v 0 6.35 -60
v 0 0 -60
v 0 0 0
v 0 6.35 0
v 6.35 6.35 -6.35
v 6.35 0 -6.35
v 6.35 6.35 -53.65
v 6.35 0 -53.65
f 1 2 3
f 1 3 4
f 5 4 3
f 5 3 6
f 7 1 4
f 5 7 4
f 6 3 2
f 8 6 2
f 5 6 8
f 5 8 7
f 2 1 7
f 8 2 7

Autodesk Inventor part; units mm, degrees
ref_plane "YZ Plane" through (0, 0, 0) normal (1, 0, 0) x (0, 1, 0)
ref_plane "XZ Plane" through (0, 0, 0) normal (0, 1, 0) x (-1, 0, 0)
ref_plane "XY Plane" through (0, 0, 0) normal (0, 0, 1) x (1, 0, 0)
sketch "Sketch1" plane through (0, 0, 0) normal (1, 0, 0) x (0, 1, 0)
  line L0 (0, 0) -> (0, -60)
  line L1 (0, -60) -> (6.35, -60)
  line L2 (6.35, -60) -> (6.35, 0)
  line L3 (6.35, 0) -> (0, 0)
  dimension "d0" = 60
  dimension "d1" = 6.35
extrude "Extrusion1" add sketch "Sketch1" along normal blind 6.35
sketch "Sketch2" plane through (0, 6.35, 0) normal (0, 1, 0) x (1, 0, 0)
  line L0 (0, 60) -> (0, 0) projected
  line L1 (0, 0) -> (4.3687, 4.3687)
  line L2 (0, 0) -> (6.1782, 0) construction
  line L3 (4.3687, 4.3687) -> (6.35, 6.35)
  line L4 (6.35, 60) -> (6.35, 0) projected
  line L5 (6.35, 6.35) -> (6.35, 0)
  line L6 (0, 0) -> (6.35, 0) projected
  line L7 (6.35, 0) -> (0, 0)
  dimension "d4" = 45
extrude "Extrusion2" cut sketch "Sketch2" against normal blind 10
sketch "Sketch3" plane through (0, 6.35, -60) normal (0, 1, 0) x (1, 0, 0)
  line L0 (0, 0) -> (6.35, -6.35)
  line L1 (6.35, 0) -> (6.35, -53.65) projected
  line L2 (0, 0) -> (8.9803, 0) construction
  line L3 (6.35, -6.35) -> (6.35, 0)
  line L4 (6.35, 0) -> (0, 0)
  point P0 (0, -60)
  dimension "d7" = 45
extrude "Extrusion3" cut sketch "Sketch3" against normal blind 10
properties part number "Angles in little squares"
